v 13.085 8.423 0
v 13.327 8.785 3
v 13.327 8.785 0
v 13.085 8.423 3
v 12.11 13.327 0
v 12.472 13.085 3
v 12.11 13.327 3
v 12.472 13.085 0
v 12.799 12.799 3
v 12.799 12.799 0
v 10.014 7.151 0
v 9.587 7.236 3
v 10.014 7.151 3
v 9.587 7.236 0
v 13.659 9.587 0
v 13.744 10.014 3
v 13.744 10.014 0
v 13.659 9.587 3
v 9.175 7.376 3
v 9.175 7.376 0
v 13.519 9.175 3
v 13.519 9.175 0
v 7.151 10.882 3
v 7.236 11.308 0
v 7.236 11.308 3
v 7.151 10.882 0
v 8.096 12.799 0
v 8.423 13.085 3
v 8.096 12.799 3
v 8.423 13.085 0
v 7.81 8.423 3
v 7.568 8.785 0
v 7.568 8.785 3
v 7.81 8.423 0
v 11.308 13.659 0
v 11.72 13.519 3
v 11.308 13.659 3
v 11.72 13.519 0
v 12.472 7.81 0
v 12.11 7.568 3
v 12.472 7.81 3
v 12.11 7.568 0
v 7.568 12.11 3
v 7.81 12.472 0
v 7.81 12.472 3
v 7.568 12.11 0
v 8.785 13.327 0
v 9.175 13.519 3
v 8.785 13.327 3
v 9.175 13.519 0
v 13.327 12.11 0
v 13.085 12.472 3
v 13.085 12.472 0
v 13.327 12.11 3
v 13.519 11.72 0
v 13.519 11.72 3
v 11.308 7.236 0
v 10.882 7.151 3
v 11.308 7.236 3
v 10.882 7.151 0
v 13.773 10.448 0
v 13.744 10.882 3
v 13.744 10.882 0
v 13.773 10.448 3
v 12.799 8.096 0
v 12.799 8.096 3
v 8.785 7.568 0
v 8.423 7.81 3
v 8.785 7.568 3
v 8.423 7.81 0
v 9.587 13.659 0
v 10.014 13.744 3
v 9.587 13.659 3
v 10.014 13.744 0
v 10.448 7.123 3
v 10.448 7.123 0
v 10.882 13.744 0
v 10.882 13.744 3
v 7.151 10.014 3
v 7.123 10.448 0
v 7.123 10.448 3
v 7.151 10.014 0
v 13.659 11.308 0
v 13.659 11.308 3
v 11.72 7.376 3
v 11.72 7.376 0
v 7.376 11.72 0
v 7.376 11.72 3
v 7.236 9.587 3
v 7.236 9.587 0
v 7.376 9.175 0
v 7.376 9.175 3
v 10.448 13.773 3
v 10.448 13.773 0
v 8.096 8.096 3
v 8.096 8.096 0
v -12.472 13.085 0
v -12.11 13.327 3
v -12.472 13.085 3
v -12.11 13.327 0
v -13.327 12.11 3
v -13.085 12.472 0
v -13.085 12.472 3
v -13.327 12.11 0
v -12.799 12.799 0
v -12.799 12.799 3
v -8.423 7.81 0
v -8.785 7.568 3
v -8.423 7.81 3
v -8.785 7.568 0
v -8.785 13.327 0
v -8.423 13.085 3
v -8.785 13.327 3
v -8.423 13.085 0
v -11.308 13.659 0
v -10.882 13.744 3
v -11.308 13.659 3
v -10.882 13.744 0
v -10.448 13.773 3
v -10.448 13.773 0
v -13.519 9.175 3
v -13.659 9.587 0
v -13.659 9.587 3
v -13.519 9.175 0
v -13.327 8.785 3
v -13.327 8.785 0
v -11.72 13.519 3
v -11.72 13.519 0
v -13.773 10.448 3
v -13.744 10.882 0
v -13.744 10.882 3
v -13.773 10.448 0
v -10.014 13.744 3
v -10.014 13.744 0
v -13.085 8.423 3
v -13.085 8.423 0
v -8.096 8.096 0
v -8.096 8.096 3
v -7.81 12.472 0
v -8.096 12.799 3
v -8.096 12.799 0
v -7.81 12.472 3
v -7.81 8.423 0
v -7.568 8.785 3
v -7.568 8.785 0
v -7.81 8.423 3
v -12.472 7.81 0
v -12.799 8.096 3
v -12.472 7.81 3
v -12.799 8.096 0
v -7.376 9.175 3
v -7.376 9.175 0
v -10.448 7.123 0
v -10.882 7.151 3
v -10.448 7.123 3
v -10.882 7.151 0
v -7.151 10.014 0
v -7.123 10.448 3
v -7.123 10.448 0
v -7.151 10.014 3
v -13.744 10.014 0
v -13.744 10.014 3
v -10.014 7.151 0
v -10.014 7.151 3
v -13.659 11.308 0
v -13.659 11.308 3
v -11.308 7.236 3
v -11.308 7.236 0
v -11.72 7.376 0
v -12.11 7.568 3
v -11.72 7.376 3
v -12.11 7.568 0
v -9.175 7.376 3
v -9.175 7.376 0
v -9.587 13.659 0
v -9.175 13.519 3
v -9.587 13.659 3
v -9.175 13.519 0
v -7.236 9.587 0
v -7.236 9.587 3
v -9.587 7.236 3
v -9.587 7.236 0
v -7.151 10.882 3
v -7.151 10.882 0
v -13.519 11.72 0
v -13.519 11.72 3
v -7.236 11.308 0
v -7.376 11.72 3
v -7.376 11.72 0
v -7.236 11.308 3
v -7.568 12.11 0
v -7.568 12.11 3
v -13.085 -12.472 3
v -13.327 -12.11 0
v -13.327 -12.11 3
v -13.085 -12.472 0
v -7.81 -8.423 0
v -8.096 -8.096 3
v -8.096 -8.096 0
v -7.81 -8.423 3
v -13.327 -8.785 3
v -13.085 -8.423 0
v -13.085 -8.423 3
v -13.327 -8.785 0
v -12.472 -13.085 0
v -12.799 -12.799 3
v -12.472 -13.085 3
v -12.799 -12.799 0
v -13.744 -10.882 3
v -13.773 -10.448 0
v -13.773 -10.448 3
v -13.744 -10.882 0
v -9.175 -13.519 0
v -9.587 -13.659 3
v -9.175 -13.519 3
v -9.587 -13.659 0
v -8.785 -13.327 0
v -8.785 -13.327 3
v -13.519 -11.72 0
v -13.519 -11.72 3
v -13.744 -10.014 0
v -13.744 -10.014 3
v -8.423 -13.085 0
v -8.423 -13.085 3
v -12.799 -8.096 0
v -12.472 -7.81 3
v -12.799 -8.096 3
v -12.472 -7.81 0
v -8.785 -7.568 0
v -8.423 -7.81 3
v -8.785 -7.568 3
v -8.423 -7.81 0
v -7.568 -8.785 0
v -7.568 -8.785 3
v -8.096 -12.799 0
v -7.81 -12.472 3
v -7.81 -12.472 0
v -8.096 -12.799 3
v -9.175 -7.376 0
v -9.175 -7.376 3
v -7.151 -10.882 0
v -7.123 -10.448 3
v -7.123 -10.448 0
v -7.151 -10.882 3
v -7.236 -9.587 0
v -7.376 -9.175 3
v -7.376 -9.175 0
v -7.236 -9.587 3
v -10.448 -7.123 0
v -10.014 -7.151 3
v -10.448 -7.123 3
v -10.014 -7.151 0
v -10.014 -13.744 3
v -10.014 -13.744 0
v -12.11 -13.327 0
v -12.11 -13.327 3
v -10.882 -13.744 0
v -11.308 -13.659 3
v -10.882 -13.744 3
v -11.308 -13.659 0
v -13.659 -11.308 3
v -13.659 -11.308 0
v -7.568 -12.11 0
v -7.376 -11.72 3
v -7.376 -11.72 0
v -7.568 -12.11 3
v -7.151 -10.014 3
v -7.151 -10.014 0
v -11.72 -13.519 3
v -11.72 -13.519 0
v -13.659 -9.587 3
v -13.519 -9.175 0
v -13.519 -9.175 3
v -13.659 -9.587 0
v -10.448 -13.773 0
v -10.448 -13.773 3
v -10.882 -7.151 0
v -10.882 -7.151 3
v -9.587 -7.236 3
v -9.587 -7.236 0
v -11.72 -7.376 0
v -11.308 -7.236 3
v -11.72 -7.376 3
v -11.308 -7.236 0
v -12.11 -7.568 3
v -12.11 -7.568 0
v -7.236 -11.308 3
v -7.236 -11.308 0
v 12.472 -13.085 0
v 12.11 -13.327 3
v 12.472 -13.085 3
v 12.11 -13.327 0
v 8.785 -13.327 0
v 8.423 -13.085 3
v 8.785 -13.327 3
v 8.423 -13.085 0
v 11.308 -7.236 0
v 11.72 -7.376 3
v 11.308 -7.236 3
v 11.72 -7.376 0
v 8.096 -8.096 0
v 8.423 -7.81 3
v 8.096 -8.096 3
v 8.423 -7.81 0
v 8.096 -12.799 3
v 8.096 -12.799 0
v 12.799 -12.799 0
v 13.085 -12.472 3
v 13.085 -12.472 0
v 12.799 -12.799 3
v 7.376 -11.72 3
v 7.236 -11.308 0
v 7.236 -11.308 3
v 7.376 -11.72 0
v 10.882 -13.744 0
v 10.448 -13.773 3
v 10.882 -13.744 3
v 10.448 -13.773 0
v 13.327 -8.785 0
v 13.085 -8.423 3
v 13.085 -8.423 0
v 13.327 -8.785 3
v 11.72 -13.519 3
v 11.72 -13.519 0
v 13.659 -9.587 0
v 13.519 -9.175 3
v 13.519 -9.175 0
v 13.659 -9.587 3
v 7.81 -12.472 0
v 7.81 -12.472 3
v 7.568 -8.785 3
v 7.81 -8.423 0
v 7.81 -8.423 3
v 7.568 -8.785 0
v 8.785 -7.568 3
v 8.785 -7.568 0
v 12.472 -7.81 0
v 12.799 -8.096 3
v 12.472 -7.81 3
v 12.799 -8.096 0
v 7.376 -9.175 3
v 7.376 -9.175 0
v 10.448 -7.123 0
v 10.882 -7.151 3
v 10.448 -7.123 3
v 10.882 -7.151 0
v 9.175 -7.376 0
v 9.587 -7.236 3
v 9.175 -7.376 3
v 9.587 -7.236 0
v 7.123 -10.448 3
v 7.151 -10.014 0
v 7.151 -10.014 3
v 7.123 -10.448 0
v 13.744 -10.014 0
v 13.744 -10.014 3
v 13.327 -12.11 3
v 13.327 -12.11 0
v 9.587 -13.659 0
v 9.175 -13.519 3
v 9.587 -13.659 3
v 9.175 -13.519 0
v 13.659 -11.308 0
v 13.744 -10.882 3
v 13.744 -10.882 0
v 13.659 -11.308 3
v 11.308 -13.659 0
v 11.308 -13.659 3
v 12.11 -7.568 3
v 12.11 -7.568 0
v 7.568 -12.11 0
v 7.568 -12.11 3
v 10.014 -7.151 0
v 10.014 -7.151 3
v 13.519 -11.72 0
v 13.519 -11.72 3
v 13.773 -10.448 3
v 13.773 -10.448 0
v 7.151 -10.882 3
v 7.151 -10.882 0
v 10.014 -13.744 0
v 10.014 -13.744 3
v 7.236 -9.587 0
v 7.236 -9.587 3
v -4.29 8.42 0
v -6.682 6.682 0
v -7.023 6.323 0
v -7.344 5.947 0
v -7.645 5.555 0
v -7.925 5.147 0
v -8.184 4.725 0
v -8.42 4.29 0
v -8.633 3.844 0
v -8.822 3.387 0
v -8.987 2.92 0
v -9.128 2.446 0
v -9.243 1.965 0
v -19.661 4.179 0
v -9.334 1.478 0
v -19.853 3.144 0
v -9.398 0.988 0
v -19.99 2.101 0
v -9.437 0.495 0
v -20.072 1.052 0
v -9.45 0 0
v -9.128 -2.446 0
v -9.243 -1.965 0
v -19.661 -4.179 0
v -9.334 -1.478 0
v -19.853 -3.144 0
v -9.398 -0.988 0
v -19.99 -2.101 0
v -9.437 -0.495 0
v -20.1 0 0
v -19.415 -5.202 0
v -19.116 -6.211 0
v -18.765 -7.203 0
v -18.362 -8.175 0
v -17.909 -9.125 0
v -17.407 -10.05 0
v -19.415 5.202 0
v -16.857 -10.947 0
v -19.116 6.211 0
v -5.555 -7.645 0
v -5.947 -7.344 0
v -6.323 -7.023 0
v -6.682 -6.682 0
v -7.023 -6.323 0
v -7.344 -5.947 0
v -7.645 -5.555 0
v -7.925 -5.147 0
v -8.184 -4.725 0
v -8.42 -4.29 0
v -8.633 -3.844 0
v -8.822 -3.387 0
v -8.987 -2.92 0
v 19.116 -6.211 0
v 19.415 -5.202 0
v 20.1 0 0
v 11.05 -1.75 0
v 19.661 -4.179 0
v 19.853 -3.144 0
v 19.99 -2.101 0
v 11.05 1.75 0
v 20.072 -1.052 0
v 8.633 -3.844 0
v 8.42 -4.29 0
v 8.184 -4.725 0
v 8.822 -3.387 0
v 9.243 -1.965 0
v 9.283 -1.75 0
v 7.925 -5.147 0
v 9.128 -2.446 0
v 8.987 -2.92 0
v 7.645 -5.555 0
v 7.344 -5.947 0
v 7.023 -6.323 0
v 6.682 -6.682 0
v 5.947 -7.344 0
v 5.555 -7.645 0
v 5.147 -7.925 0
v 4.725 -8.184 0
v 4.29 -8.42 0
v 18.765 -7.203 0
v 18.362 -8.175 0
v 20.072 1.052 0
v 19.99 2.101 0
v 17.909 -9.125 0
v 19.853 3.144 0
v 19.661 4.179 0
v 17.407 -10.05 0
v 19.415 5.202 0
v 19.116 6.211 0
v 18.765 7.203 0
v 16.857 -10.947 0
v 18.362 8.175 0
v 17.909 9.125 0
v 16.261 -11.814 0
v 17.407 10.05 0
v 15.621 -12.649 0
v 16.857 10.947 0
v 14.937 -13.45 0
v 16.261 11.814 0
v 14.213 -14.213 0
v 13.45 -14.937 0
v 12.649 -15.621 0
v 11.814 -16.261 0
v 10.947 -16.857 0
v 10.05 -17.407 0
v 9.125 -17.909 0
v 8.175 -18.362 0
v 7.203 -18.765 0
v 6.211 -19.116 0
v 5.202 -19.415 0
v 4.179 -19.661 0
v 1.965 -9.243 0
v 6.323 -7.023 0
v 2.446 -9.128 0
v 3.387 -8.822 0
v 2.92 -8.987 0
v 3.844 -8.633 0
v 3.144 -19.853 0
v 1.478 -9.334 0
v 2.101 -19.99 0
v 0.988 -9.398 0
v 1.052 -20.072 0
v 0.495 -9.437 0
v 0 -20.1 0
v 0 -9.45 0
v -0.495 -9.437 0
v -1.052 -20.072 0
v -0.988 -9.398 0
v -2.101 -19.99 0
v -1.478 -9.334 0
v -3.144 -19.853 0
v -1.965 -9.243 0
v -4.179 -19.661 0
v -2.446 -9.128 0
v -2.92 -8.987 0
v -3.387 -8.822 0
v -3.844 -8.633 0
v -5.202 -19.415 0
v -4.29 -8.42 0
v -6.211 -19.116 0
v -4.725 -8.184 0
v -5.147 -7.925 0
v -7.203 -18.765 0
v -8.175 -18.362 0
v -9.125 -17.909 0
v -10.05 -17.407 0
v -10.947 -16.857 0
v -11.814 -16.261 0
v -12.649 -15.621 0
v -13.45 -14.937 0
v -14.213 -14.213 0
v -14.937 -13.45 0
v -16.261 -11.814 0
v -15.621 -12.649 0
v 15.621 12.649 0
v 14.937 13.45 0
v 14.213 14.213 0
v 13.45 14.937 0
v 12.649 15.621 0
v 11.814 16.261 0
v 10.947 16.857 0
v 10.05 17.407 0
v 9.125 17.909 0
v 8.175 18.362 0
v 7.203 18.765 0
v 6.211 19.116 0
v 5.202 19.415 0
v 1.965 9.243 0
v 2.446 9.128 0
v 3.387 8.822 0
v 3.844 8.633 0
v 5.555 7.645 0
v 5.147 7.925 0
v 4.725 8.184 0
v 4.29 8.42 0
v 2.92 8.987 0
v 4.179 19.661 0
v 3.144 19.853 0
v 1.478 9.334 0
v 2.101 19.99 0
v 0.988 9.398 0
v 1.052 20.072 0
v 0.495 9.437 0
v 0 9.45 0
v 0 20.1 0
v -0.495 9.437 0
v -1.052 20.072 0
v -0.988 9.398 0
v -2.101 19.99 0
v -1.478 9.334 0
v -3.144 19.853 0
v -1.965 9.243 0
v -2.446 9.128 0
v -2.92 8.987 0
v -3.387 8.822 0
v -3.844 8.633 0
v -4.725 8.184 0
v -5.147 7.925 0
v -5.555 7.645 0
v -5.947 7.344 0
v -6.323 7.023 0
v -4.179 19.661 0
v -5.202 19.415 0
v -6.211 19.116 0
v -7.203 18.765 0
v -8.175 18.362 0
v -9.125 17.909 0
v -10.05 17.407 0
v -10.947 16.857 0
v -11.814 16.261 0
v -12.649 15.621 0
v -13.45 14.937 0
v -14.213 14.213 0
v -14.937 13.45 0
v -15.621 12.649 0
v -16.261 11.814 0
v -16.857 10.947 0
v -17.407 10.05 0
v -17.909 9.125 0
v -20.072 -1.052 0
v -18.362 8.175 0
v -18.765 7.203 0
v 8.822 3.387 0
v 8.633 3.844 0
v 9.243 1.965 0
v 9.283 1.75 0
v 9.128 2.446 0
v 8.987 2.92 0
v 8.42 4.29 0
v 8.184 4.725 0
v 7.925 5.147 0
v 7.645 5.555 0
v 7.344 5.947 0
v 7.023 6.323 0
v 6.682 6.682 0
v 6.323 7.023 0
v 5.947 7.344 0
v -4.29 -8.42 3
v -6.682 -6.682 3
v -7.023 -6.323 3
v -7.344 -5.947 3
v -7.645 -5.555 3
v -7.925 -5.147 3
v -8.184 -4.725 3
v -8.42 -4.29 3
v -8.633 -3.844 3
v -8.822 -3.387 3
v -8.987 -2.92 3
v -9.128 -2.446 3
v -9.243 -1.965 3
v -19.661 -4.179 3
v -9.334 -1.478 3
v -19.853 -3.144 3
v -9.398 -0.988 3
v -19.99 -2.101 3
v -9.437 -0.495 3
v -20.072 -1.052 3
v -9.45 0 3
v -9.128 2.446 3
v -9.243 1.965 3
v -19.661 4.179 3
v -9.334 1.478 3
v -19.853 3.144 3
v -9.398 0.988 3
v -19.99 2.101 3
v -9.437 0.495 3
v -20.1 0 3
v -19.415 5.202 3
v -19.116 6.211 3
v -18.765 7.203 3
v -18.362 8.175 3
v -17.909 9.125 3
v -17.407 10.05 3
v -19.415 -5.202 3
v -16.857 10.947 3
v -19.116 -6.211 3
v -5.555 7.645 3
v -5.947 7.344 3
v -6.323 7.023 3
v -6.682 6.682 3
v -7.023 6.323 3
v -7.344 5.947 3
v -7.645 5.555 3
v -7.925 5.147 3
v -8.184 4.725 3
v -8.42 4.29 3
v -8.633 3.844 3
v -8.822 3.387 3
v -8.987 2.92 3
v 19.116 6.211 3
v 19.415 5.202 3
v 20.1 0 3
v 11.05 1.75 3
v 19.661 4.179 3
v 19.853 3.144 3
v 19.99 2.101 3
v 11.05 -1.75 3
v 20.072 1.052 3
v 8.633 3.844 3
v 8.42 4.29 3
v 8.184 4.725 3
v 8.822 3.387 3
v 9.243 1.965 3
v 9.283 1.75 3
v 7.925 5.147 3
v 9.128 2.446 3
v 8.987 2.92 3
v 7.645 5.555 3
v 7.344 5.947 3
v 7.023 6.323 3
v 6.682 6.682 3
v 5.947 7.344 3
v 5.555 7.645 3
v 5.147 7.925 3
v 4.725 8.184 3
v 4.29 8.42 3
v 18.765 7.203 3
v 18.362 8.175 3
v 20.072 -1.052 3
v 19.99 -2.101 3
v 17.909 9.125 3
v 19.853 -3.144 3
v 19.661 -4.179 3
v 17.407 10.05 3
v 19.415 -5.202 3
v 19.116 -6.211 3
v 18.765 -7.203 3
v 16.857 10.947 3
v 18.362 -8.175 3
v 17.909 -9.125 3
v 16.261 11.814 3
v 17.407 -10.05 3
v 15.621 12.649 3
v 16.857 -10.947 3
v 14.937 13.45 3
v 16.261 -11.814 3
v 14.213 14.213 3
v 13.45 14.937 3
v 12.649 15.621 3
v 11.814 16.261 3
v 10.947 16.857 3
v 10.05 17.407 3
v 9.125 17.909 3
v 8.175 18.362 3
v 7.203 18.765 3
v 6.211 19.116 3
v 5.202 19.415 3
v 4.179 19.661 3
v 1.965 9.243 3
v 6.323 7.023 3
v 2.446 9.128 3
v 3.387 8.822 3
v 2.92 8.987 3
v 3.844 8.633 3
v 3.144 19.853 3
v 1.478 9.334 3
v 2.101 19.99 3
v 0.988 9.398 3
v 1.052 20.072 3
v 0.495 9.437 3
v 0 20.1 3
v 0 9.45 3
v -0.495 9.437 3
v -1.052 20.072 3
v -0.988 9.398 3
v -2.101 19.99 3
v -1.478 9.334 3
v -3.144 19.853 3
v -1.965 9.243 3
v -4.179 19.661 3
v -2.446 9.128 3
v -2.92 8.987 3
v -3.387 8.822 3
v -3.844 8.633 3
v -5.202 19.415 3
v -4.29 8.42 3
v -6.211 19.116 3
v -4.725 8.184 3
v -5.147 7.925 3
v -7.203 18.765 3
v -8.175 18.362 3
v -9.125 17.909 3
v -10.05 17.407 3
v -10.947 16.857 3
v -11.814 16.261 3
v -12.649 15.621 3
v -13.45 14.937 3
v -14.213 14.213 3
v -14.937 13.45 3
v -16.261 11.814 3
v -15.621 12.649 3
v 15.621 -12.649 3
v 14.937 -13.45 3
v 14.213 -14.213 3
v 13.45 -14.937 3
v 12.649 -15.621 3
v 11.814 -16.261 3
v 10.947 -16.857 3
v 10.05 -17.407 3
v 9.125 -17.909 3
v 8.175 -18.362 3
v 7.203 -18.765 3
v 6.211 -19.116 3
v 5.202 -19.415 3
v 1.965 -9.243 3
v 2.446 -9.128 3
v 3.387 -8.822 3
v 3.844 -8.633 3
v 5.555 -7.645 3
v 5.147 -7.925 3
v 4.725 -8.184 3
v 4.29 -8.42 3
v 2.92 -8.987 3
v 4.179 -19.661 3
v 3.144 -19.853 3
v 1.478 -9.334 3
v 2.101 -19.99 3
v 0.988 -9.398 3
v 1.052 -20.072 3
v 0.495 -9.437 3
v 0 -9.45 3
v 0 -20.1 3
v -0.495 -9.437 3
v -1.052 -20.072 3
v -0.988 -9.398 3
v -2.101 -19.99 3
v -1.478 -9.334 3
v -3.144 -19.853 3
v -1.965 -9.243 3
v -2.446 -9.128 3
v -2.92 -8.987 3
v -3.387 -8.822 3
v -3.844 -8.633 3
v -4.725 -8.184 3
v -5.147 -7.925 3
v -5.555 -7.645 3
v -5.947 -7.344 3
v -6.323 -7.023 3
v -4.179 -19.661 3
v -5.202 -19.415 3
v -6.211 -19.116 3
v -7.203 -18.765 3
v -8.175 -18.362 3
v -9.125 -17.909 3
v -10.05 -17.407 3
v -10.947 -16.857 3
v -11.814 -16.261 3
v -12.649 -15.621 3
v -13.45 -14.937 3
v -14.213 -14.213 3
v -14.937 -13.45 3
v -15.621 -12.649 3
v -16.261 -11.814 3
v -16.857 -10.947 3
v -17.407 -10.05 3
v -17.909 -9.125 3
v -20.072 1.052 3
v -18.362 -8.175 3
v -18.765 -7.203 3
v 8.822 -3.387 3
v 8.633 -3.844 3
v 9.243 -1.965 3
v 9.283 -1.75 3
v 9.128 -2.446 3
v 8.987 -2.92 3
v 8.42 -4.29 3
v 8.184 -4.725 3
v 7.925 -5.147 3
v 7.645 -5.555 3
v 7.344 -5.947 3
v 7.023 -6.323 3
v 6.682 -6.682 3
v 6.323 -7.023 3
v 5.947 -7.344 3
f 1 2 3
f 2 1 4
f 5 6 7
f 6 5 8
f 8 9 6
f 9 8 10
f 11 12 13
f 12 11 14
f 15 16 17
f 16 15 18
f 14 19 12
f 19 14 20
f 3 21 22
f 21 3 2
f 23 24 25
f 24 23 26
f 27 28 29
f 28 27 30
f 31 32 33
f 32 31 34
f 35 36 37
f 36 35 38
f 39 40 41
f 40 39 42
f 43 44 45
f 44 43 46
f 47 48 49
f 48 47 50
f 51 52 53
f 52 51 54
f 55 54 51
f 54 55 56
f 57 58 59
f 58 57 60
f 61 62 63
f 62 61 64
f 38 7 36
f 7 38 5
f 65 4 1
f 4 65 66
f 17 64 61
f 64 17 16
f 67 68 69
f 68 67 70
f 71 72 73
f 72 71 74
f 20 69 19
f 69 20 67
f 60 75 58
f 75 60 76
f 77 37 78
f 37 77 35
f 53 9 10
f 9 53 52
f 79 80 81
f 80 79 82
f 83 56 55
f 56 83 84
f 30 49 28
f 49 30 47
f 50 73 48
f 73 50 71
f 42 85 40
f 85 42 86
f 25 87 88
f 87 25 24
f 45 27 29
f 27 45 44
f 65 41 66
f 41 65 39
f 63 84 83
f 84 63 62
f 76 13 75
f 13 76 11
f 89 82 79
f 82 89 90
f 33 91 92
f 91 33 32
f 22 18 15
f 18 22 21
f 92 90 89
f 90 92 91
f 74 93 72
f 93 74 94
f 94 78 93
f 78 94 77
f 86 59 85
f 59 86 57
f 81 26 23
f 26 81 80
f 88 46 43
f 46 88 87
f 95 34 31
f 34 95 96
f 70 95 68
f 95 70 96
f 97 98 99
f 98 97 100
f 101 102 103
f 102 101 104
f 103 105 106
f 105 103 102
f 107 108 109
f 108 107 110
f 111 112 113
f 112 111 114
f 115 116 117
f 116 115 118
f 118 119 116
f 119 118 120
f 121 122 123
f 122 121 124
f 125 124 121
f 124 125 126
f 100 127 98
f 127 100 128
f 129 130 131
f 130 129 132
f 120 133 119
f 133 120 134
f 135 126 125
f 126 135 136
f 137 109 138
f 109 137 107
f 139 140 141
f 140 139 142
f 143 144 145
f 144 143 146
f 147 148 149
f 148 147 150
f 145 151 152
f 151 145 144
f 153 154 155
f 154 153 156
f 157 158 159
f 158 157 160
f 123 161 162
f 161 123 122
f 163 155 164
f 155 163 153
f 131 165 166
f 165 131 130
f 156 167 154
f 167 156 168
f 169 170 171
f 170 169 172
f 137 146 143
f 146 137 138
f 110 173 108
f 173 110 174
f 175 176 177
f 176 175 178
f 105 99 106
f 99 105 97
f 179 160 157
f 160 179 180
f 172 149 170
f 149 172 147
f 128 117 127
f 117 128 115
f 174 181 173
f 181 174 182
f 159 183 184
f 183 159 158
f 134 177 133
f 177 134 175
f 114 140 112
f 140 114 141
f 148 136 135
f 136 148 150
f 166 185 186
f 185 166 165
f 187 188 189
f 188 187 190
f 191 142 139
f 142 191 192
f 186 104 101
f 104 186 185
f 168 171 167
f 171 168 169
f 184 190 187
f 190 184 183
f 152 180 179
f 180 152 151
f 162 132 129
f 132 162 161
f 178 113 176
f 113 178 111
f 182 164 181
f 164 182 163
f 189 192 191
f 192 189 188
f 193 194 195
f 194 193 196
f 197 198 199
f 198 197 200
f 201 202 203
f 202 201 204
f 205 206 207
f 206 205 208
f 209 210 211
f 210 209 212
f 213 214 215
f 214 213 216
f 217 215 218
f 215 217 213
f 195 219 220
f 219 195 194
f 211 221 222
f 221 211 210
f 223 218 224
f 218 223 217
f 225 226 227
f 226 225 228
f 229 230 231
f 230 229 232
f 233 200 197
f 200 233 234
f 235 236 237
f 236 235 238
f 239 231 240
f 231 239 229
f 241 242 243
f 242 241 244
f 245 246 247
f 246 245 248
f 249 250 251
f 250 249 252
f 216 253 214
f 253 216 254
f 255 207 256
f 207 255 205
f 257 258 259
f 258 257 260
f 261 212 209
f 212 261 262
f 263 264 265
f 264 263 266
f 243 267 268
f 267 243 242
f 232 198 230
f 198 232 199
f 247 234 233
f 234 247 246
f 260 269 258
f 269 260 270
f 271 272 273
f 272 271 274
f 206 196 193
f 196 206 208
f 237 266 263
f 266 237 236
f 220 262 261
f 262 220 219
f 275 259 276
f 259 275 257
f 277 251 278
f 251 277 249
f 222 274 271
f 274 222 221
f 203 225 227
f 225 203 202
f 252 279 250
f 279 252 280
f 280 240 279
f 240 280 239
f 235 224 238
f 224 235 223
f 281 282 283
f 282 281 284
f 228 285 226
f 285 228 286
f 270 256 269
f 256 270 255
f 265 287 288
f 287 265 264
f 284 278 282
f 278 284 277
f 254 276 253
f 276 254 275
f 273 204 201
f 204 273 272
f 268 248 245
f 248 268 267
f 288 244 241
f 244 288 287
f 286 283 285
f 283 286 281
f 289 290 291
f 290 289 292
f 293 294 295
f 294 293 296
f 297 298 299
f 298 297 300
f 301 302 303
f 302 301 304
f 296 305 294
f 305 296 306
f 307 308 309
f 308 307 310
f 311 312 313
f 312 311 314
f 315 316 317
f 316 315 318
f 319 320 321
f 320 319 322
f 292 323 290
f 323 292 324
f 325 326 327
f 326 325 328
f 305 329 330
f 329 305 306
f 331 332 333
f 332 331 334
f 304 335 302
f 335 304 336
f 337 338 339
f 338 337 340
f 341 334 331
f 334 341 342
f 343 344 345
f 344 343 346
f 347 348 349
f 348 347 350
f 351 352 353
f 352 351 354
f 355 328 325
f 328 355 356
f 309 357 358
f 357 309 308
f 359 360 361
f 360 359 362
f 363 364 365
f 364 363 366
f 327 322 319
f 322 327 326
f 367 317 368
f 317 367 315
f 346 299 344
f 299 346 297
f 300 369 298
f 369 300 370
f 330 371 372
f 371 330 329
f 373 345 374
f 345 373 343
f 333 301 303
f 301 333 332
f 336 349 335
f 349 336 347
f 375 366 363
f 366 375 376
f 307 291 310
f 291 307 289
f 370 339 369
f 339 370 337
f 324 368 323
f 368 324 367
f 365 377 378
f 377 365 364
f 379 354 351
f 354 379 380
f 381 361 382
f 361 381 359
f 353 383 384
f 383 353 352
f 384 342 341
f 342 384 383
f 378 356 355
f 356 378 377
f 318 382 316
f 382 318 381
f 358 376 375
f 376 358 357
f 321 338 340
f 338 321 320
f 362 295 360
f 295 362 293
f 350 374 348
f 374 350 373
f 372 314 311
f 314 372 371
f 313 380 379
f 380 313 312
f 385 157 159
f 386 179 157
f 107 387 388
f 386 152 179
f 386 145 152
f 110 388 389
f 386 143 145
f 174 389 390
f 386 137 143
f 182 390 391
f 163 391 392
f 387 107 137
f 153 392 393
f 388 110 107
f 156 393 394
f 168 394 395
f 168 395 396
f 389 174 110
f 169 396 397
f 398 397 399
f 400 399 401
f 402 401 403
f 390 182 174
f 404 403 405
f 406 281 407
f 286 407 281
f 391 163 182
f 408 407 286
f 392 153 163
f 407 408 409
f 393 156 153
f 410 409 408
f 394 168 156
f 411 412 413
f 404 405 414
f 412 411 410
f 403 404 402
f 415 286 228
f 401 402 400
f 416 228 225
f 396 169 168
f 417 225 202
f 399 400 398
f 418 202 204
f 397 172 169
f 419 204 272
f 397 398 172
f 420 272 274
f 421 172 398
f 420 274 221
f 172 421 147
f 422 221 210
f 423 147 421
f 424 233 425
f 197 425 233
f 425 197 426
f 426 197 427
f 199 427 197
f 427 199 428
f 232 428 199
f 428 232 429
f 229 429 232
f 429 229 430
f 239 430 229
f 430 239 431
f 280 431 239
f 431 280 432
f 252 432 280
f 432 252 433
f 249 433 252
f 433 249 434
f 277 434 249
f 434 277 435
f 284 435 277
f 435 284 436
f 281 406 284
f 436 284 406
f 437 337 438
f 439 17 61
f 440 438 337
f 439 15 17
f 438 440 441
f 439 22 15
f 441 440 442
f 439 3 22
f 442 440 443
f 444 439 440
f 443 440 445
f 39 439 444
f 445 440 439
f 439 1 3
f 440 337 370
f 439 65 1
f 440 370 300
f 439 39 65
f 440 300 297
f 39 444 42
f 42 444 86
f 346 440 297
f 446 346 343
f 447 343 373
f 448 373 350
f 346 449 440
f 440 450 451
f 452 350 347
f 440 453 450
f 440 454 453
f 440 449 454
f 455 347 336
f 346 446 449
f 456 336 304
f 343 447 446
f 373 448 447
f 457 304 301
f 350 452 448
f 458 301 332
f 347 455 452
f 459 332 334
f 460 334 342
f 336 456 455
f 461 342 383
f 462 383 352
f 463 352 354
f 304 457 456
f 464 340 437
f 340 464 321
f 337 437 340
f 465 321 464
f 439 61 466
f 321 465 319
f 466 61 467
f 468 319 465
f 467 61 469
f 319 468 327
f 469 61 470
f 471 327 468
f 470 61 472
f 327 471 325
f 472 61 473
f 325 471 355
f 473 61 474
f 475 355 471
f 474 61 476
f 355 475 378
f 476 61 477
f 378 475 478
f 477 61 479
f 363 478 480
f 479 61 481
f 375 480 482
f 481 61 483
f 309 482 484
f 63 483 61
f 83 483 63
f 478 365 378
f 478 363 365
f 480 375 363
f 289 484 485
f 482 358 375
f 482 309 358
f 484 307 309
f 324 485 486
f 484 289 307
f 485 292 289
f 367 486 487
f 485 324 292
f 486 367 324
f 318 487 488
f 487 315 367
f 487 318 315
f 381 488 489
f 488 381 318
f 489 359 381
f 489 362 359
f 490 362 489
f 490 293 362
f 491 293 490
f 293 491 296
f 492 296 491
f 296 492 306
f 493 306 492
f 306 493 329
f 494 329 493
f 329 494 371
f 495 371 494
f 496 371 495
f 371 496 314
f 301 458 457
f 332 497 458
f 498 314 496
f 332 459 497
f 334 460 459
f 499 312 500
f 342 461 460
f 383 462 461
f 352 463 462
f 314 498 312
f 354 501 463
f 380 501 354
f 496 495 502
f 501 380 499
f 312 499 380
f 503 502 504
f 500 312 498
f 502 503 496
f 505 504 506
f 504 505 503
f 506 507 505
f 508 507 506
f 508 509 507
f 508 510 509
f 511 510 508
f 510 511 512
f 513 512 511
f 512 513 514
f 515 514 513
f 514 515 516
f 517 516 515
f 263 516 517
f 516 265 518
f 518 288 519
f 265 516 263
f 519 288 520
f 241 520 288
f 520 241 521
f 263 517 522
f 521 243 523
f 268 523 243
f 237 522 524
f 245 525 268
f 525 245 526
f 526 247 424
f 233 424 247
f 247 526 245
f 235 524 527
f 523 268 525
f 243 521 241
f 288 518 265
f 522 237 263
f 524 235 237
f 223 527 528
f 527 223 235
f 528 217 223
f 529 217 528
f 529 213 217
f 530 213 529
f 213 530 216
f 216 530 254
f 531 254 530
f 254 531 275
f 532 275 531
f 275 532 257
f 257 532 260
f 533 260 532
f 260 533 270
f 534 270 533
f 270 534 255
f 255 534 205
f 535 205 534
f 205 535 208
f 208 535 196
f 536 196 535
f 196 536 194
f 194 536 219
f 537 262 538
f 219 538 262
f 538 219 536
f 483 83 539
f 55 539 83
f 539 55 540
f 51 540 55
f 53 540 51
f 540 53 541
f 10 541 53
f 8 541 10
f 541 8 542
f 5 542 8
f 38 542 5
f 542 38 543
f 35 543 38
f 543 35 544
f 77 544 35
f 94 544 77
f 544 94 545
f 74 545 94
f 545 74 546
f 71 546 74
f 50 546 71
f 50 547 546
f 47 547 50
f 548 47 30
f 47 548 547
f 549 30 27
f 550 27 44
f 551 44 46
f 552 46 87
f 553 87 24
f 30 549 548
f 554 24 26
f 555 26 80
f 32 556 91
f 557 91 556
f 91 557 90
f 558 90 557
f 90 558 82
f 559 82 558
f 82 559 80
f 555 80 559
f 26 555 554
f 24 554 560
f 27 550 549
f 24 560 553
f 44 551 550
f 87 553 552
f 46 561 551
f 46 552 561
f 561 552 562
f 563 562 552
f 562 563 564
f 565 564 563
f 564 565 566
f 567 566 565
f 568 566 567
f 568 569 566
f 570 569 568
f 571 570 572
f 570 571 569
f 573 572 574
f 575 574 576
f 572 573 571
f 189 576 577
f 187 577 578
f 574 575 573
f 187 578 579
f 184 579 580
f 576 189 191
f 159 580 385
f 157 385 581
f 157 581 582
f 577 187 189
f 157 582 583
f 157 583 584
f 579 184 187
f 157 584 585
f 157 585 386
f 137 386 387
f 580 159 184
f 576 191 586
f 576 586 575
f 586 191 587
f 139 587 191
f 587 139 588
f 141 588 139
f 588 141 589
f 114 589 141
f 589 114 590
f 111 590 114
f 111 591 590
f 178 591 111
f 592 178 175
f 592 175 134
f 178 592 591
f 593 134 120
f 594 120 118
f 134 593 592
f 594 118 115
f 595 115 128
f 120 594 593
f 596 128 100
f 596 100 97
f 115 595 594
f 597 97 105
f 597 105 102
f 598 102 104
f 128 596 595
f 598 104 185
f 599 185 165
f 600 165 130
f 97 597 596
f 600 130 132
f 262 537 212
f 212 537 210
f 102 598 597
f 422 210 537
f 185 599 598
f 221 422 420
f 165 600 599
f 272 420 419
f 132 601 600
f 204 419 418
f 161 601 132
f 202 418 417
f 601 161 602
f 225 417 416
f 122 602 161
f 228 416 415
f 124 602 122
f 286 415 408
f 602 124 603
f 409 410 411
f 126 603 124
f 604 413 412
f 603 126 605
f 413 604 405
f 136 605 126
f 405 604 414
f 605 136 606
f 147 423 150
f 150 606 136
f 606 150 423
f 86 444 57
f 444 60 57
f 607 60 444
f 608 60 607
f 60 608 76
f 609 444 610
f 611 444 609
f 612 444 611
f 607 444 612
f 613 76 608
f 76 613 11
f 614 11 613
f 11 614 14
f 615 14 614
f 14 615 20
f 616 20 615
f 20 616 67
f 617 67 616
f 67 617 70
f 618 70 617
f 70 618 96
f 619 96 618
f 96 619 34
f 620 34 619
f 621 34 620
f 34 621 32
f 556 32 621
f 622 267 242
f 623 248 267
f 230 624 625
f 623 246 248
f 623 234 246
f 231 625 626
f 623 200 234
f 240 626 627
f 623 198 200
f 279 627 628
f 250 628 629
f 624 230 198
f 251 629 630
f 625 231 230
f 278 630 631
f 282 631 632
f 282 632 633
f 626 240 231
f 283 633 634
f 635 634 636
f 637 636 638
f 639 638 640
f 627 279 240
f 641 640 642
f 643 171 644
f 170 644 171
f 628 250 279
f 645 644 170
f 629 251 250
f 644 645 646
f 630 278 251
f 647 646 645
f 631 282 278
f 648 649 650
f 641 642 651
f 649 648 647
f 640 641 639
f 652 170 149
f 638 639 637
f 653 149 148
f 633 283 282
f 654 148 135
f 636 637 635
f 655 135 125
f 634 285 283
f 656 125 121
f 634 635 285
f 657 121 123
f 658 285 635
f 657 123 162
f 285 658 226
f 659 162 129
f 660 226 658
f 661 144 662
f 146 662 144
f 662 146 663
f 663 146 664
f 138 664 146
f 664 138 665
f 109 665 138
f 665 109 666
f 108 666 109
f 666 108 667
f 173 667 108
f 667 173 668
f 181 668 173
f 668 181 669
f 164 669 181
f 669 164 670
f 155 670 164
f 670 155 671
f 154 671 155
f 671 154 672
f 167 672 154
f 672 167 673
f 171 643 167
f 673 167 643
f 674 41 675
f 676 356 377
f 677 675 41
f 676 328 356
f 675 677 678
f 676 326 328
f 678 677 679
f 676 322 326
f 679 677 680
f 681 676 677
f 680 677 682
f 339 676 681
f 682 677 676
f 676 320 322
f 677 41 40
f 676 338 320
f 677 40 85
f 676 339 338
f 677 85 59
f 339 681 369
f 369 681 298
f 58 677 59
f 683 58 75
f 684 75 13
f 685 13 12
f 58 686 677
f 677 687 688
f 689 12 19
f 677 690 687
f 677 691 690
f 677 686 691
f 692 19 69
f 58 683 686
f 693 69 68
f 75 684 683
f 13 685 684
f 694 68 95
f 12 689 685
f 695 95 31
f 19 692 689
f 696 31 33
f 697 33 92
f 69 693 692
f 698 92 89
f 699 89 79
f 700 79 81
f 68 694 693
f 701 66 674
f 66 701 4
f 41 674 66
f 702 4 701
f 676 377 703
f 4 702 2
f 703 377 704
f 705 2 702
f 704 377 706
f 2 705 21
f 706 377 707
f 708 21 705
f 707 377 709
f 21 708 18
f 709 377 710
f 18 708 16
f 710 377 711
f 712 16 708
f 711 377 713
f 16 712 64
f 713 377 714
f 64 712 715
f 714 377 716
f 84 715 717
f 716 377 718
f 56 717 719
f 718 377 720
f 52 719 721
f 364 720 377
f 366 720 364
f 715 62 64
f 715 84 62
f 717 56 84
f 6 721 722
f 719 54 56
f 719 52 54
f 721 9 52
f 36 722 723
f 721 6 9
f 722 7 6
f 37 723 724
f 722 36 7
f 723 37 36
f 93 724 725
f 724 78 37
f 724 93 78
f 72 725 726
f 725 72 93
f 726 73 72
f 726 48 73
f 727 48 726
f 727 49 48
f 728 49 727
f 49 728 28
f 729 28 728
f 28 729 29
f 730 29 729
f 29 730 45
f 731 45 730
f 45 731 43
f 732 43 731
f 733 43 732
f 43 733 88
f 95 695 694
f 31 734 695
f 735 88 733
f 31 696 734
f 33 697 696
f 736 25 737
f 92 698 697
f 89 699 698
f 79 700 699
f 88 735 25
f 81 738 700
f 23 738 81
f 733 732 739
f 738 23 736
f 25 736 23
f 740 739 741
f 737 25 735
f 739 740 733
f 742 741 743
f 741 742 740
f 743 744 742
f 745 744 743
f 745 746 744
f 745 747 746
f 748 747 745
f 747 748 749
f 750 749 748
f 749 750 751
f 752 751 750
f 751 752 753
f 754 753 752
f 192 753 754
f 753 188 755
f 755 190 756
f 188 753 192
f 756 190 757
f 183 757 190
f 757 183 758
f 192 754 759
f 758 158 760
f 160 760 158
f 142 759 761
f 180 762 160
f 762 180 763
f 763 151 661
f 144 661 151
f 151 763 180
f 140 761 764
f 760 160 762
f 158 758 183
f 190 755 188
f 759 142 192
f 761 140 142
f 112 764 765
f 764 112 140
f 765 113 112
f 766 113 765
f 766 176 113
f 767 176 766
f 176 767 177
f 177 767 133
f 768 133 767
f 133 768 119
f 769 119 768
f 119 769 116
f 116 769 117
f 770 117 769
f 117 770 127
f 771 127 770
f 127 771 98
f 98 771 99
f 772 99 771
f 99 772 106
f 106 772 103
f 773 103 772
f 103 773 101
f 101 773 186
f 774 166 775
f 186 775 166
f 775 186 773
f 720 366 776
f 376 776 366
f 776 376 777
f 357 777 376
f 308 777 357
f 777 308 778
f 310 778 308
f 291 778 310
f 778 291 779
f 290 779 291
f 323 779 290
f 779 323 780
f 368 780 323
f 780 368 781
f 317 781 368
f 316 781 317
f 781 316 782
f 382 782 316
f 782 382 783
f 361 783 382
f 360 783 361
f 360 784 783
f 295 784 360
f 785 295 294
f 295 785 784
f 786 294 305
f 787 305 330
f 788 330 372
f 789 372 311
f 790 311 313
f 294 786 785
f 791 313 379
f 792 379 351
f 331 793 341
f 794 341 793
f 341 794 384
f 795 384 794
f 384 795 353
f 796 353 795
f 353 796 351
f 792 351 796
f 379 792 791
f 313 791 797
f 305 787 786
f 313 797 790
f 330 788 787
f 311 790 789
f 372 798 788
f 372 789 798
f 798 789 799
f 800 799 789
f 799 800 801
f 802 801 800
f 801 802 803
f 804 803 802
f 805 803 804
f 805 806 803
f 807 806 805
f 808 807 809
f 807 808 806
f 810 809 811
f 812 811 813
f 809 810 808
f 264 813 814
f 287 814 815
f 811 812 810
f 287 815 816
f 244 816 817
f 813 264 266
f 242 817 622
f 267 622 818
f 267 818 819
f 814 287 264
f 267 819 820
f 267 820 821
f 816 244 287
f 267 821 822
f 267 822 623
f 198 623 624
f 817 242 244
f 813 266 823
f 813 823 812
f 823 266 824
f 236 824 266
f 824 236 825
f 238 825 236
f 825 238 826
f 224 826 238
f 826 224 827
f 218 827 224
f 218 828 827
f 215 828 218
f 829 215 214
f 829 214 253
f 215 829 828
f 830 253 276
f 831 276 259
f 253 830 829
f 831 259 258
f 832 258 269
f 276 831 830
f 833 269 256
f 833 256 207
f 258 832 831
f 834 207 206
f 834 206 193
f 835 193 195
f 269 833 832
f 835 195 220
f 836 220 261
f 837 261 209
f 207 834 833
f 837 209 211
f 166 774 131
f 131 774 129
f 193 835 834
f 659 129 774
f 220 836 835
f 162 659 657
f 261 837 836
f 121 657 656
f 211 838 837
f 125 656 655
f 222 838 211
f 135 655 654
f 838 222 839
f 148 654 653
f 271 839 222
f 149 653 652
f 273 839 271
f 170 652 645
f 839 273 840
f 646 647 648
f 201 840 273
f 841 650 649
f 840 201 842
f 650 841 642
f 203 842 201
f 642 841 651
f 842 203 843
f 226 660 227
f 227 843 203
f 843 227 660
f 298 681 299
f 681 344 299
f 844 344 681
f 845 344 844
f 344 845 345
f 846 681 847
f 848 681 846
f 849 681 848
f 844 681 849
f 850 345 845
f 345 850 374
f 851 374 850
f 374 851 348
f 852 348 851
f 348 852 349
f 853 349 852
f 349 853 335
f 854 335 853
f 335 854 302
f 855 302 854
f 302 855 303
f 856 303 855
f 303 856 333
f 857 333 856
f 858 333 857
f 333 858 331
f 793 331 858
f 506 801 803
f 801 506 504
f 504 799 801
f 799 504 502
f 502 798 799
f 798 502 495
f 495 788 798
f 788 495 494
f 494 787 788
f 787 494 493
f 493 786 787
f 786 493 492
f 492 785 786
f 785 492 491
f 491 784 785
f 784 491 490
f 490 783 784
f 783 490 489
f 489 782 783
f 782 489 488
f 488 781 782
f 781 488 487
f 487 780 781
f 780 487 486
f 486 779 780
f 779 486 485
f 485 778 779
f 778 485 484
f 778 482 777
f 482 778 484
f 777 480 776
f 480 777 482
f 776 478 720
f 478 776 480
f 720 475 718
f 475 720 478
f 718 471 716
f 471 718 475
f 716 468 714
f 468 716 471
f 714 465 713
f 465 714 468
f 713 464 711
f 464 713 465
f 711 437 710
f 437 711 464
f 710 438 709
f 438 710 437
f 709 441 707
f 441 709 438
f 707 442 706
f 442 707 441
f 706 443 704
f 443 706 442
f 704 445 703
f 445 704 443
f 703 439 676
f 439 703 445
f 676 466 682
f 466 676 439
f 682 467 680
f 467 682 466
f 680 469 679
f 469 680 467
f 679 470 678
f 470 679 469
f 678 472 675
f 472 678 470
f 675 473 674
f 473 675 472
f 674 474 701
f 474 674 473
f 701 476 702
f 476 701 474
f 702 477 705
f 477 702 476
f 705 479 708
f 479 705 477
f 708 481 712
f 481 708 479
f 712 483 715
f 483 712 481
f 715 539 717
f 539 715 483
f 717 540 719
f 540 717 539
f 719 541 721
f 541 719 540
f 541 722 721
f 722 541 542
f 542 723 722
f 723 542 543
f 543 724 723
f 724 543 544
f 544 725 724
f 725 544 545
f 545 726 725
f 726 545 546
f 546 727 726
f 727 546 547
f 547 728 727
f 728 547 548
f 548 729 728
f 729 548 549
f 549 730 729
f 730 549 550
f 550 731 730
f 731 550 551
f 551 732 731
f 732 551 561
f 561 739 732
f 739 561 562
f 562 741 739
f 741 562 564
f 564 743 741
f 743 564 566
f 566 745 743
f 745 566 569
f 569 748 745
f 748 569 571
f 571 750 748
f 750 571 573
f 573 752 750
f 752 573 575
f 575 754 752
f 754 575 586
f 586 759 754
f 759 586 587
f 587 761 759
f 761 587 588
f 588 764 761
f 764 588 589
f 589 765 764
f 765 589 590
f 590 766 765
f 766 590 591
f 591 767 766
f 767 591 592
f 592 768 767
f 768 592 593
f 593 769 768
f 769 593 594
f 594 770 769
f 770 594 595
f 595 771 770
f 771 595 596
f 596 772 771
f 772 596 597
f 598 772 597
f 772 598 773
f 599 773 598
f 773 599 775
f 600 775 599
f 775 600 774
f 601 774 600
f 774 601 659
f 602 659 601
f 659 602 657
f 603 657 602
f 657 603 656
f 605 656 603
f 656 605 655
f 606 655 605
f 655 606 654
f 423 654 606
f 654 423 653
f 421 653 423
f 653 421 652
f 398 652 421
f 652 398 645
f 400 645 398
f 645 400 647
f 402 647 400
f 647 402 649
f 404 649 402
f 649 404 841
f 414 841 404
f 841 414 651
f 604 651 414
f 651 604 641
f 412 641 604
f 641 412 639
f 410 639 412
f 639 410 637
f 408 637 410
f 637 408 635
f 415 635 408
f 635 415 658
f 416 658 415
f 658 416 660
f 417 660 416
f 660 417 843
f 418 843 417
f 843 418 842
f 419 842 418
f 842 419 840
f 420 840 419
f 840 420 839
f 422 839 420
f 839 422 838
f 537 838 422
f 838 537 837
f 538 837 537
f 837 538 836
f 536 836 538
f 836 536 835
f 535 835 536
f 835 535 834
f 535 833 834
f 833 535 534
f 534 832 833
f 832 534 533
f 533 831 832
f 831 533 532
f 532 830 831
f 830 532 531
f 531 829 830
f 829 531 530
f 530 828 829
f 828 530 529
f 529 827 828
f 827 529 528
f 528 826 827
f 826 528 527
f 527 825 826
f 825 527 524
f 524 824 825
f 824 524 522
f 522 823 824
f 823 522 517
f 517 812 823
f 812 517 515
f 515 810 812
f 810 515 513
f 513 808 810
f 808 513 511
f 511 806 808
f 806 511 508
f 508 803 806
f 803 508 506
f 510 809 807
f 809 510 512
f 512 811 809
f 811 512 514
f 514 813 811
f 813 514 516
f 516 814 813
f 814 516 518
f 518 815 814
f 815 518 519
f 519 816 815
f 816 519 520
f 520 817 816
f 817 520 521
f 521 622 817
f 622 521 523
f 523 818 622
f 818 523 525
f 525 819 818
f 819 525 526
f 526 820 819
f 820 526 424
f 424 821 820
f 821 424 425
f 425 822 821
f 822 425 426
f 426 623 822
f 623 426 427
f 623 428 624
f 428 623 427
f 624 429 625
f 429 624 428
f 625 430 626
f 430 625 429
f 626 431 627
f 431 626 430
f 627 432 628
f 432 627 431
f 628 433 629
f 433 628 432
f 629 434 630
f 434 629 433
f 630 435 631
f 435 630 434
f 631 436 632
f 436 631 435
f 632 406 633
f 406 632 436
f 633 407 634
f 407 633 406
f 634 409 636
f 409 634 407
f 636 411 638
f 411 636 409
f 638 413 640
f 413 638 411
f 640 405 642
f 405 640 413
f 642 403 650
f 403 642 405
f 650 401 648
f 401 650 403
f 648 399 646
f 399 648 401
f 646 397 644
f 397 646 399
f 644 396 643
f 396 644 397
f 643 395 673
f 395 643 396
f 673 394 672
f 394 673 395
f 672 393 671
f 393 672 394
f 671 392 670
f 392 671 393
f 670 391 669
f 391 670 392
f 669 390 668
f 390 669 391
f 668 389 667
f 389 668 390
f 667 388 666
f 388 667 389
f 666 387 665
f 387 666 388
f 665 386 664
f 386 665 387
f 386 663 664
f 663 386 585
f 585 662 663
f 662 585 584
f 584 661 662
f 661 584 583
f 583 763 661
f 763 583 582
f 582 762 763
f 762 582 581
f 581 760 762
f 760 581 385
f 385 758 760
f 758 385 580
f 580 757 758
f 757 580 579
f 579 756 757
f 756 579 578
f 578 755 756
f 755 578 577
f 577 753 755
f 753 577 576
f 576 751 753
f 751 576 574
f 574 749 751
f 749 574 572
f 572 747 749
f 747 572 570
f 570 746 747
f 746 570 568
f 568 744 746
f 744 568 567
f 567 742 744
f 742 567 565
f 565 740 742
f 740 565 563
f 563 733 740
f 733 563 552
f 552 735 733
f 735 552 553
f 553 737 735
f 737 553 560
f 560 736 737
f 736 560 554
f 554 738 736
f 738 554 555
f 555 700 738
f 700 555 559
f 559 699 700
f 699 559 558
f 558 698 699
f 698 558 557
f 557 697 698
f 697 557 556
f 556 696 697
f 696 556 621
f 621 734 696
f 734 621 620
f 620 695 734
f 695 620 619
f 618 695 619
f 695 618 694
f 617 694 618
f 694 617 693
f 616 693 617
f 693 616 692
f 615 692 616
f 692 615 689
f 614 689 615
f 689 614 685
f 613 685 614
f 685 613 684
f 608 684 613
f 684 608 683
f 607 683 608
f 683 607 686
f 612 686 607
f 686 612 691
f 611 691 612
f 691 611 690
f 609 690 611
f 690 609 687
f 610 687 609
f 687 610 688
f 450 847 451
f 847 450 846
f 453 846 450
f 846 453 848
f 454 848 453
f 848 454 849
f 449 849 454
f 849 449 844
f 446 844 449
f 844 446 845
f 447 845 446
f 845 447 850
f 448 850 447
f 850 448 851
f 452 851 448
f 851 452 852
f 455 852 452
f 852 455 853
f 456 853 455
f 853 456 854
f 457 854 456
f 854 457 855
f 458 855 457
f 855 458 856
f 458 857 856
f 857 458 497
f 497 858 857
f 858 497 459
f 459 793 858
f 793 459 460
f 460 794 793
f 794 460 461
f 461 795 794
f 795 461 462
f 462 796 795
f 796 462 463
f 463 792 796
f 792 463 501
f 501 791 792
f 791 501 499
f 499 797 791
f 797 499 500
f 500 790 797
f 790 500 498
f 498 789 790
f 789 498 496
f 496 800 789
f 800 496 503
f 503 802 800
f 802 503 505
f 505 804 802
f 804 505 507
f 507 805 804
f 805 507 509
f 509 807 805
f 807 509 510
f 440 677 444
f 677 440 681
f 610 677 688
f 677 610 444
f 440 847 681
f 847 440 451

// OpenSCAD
// file: rocketlib.scad
// rocketlib.scad — shared dimensions and profile maths for Cosmic Codex rocket parts.
// Units: millimetres. Z axis = rocket axis, +Z points toward the nose.
//
// Body-tube sizes are the nominal Estes-standard values (inches → mm):
//   BT-5  0.544 / 0.518 in   BT-20 0.736 / 0.710 in   BT-50 0.976 / 0.950 in
//   BT-55 1.325 / 1.283 in   BT-60 1.637 / 1.595 in   BT-70 2.217 / 2.175 in
//   BT-80 2.600 / 2.558 in
// Real tubes vary by ±0.1 mm between batches and brands: MEASURE yours with calipers
// and use tube = "custom" if the fit is wrong.

// [outer diameter, inner diameter] in mm
function tube_dims(name, custom_od = 24.8, custom_id = 24.1) =
    name == "BT-5"  ? [13.8, 13.2] :
    name == "BT-20" ? [18.7, 18.0] :
    name == "BT-50" ? [24.8, 24.1] :
    name == "BT-55" ? [33.7, 32.6] :
    name == "BT-60" ? [41.6, 40.5] :
    name == "BT-70" ? [56.3, 55.2] :
    name == "BT-80" ? [66.0, 65.0] :
    [custom_od, custom_id];

// Motor casings (certified commercial motors only — see experiments/SAFETY.md)
//   13 mm "mini"  : 13 x 45 mm   (1/4A–A)
//   18 mm standard: 18 x 70 mm   (A–C, e.g. A8-3, B6-4, C6-5)
//   24 mm standard: 24 x 70 mm   (C–D, e.g. D12-3); some E motors are 95 mm long
function motor_len(d) = d == 13 ? 45 : 70;
// The paper motor tube that each motor normally lives in: [od, id]
function motor_tube(d) = d == 13 ? tube_dims("BT-5") : d == 18 ? tube_dims("BT-20") : tube_dims("BT-50");

PI_ = 3.14159265358979;

// Nose-cone radius y at distance x from the tip (0 <= x <= L), base radius R.
// Formulas: Crowell, "The Descriptive Geometry of Nose Cones" (1996).
// OpenSCAD trig works in DEGREES; the Haack series needs theta in radians too.
function nose_r(shape, x, L, R, n = 0.5, K = 1) =
    let(t = max(0, min(1, x / L)))
    shape == "conical"    ? R * t :
    shape == "ogive"      ? let(rho = (R * R + L * L) / (2 * R))           // tangent ogive
                            sqrt(max(0, rho * rho - (L - x) * (L - x))) + R - rho :
    shape == "elliptical" ? R * sqrt(max(0, 1 - (1 - t) * (1 - t))) :
    shape == "parabolic"  ? R * (2 * t - K * t * t) / (2 - K) :
    shape == "power"      ? R * pow(t, n) :
    // Haack series: C = 0 → von Kármán (LD-Haack), C = 1/3 → LV-Haack
    let(C = shape == "lvhaack" ? 1 / 3 : 0,
        th_deg = acos(1 - 2 * t),
        th = th_deg * PI_ / 180,
        s = sin(th_deg))
    R / sqrt(PI_) * sqrt(max(0, th - sin(2 * th_deg) / 2 + C * s * s * s));

// n+1 stations from tip to base, clustered near the tip (where most shapes curve hardest)
function stations(L, n) = [for (i = [0 : n]) L * pow(i / n, 1.6)];
// main file
// motor_mount.scad — centering rings, engine blocks and a one-piece motor mount
// for 18 mm and 24 mm certified model-rocket motors.
// Cosmic Codex · experiments/21-3d-printed-model-rocket · MIT licence
//
//   part = "ring"   centering ring: motor tube (BT-20 / BT-50) → body tube
//   part = "block"  engine block (thrust ring) glued inside the FORWARD end of the paper motor tube
//   part = "mount"  one-piece printed motor tube + thrust lip + two centering rings
//
// SAFETY: this holds commercially made, certified motors only (NAR Model Rocket Safety
// Code rule 2). Never modify a motor. Motor casings get hot after burnout: print mounts in
// PETG or ASA, not PLA, and keep a paper motor tube when you can (part = "ring").
//
//   openscad -o ring_18mm_BT60.stl -D 'part="ring"' -D 'motor=18' -D 'tube="BT-60"' motor_mount.scad

include <rocketlib.scad>

/* [What to make] */
part = "ring";           // [ring, block, mount]
motor = 18;              // [13, 18, 24] motor diameter (mm)
tube = "BT-60";          // [BT-50, BT-55, BT-60, BT-70, BT-80, custom] body tube
custom_od = 41.6;
custom_id = 40.5;

/* [Centering ring] */
ring_t = 3.0;            // thickness
fit_out = 0.15;          // radial clearance to the body tube wall
fit_in = 0.10;           // radial clearance to the motor tube
hook_notch = true;       // notch for a metal engine hook running along the motor tube
notch_w = 3.5;           // hook notch width (mm)
notch_d = 1.6;           // hook notch depth (mm)
lightening = true;       // lightening holes on big rings

/* [Engine block] */
block_len = 6;
block_id = 0;            // 0 = auto (leaves a 2 mm shoulder for the motor to push on)

/* [One-piece mount] */
mount_wall = 1.4;
motor_fit = 0.25;        // radial clearance around the motor casing
lip = 2.0;               // forward thrust lip (radial)
overhang = 6;            // motor sticks out this far aft (for the hook / to grab it)

$fn = 120;

bd = tube_dims(tube, custom_od, custom_id);
mt = motor_tube(motor);          // [od, id] of the matching paper motor tube

module ring2d(ro, ri) { difference() { circle(r = ro); circle(r = ri); } }

module centering_ring(ri) {
    ro = bd[1] / 2 - fit_out;
    difference() {
        linear_extrude(ring_t) ring2d(ro, ri);
        if (hook_notch) translate([ri - 0.5, -notch_w / 2, -1]) cube([notch_d + 0.5, notch_w, ring_t + 2]);
        // lightening holes when there is room (≥ 7 mm radial land)
        land = ro - ri;
        if (lightening && land > 9) {
            rm = (ro + ri) / 2; hr = (land - 4) / 2;
            for (a = [45 : 90 : 315]) rotate([0, 0, a]) translate([rm, 0, -1]) cylinder(r = hr, h = ring_t + 2, $fn = 48);
        }
    }
}

if (part == "ring") {
    centering_ring(mt[0] / 2 + fit_in);
}

if (part == "block") {
    ro = mt[1] / 2 - 0.1;
    ri = block_id > 0 ? block_id / 2 : motor / 2 - 2;
    linear_extrude(block_len) ring2d(ro, ri);
}

if (part == "mount") {
    ri = motor / 2 + motor_fit;              // bore for the casing
    ro = ri + mount_wall;
    Lm = motor_len(motor) - overhang;        // printed tube length up to the lip
    difference() {
        union() {
            cylinder(r = ro, h = Lm + 2);                          // tube + lip section
            translate([0, 0, 2])         centering_ring(ro - 0.4);  // aft ring (2 mm up from the end)
            translate([0, 0, Lm - ring_t]) centering_ring(ro - 0.4);// forward ring
        }
        translate([0, 0, -1]) cylinder(r = ri, h = Lm + 1);           // motor bore (stops at the lip)
        translate([0, 0, -1]) cylinder(r = ri - lip, h = Lm + 4);     // ejection-gas passage through the lip
    }
    // Retention: this one-piece mount has no hook. Retain the motor with a snug masking-tape
    // friction wrap (the classic method), or use the paper-tube + kit engine hook build instead.
}
